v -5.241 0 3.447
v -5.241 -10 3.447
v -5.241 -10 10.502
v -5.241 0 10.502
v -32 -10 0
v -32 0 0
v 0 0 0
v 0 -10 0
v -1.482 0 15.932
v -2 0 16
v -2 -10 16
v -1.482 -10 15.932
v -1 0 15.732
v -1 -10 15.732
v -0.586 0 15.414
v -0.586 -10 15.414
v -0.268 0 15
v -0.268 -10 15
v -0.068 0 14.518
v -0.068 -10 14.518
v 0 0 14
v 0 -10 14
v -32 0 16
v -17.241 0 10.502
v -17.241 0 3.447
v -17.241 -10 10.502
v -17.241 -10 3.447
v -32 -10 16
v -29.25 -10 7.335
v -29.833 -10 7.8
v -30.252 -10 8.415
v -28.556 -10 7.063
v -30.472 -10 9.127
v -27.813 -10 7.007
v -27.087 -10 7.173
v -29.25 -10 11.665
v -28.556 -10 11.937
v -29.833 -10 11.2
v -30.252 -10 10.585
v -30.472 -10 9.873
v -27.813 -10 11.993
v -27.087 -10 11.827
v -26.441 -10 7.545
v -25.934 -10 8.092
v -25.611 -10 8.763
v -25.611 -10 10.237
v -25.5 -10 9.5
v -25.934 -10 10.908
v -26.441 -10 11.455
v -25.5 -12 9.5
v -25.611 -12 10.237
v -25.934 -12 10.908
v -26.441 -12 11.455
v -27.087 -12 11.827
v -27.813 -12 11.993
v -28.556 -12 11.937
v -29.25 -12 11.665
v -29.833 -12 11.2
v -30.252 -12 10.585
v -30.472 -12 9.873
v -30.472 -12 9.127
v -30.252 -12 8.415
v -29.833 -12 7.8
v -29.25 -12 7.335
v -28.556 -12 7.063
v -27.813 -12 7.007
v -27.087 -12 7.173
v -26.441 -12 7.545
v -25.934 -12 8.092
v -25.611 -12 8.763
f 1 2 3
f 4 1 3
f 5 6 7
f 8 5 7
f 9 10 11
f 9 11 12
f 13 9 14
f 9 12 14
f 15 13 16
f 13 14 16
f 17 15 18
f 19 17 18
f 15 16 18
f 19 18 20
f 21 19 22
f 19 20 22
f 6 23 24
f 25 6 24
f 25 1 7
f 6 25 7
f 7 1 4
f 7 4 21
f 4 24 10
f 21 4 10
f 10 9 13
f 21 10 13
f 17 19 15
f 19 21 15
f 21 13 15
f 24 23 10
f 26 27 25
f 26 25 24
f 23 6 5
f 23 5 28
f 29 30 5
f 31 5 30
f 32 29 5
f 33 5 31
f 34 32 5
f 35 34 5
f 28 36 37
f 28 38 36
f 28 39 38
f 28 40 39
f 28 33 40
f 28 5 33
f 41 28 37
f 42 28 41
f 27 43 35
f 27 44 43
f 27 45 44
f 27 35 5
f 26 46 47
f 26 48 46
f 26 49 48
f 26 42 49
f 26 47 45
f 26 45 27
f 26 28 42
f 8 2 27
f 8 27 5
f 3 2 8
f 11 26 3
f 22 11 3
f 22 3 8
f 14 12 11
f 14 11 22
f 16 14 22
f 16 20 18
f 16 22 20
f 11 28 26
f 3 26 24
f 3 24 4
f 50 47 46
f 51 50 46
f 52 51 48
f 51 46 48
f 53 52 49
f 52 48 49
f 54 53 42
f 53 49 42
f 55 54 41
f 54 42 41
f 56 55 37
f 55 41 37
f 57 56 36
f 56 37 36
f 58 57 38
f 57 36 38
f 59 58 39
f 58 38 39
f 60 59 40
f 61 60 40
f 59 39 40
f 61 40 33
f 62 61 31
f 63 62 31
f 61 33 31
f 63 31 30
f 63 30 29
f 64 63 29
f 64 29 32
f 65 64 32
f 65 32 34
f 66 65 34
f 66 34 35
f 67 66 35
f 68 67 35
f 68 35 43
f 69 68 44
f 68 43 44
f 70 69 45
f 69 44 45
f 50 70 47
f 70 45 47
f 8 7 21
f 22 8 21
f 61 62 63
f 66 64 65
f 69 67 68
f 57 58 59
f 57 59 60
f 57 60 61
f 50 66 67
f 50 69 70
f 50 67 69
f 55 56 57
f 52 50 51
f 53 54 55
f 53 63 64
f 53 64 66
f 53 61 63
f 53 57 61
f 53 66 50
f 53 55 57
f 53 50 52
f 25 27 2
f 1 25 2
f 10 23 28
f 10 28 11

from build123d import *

# Parameters (mm, degrees)
F0_W     = 32
F0_H     = 16
F1_DEPTH = 10
F2_R     = 2.5
F3_DEPTH = 2
F4_R     = 2
F5_W     = 12
F5_H     = 7.054545
F6_DEPTH = 10


with BuildPart() as f1:
    # F0 (on Front) → F1 (new body)
    with BuildSketch(Plane.XZ):
        with Locations((-16, 8)):
            Rectangle(F0_W, F0_H)
    extrude(amount=F1_DEPTH)

    # F2 (on face) → F3 (join)
    with BuildSketch(Plane.XZ.offset(10)):
        with Locations((-28, 9.5)):
            Circle(F2_R)
    extrude(amount=F3_DEPTH)

    # F4
    f4_edges = [f1.edges().sort_by_distance(p)[0] for p in [
        (0, -5, 16),
    ]]
    fillet(f4_edges, radius=F4_R)

    # F5 (on face) → F6 (cut, through all)
    with BuildSketch(Plane.XZ.offset(10)):
        with Locations((-11.240668, 6.974615)):
            Rectangle(F5_W, F5_H)
    extrude(amount=-F6_DEPTH, mode=Mode.SUBTRACT)


solid = f1.part
